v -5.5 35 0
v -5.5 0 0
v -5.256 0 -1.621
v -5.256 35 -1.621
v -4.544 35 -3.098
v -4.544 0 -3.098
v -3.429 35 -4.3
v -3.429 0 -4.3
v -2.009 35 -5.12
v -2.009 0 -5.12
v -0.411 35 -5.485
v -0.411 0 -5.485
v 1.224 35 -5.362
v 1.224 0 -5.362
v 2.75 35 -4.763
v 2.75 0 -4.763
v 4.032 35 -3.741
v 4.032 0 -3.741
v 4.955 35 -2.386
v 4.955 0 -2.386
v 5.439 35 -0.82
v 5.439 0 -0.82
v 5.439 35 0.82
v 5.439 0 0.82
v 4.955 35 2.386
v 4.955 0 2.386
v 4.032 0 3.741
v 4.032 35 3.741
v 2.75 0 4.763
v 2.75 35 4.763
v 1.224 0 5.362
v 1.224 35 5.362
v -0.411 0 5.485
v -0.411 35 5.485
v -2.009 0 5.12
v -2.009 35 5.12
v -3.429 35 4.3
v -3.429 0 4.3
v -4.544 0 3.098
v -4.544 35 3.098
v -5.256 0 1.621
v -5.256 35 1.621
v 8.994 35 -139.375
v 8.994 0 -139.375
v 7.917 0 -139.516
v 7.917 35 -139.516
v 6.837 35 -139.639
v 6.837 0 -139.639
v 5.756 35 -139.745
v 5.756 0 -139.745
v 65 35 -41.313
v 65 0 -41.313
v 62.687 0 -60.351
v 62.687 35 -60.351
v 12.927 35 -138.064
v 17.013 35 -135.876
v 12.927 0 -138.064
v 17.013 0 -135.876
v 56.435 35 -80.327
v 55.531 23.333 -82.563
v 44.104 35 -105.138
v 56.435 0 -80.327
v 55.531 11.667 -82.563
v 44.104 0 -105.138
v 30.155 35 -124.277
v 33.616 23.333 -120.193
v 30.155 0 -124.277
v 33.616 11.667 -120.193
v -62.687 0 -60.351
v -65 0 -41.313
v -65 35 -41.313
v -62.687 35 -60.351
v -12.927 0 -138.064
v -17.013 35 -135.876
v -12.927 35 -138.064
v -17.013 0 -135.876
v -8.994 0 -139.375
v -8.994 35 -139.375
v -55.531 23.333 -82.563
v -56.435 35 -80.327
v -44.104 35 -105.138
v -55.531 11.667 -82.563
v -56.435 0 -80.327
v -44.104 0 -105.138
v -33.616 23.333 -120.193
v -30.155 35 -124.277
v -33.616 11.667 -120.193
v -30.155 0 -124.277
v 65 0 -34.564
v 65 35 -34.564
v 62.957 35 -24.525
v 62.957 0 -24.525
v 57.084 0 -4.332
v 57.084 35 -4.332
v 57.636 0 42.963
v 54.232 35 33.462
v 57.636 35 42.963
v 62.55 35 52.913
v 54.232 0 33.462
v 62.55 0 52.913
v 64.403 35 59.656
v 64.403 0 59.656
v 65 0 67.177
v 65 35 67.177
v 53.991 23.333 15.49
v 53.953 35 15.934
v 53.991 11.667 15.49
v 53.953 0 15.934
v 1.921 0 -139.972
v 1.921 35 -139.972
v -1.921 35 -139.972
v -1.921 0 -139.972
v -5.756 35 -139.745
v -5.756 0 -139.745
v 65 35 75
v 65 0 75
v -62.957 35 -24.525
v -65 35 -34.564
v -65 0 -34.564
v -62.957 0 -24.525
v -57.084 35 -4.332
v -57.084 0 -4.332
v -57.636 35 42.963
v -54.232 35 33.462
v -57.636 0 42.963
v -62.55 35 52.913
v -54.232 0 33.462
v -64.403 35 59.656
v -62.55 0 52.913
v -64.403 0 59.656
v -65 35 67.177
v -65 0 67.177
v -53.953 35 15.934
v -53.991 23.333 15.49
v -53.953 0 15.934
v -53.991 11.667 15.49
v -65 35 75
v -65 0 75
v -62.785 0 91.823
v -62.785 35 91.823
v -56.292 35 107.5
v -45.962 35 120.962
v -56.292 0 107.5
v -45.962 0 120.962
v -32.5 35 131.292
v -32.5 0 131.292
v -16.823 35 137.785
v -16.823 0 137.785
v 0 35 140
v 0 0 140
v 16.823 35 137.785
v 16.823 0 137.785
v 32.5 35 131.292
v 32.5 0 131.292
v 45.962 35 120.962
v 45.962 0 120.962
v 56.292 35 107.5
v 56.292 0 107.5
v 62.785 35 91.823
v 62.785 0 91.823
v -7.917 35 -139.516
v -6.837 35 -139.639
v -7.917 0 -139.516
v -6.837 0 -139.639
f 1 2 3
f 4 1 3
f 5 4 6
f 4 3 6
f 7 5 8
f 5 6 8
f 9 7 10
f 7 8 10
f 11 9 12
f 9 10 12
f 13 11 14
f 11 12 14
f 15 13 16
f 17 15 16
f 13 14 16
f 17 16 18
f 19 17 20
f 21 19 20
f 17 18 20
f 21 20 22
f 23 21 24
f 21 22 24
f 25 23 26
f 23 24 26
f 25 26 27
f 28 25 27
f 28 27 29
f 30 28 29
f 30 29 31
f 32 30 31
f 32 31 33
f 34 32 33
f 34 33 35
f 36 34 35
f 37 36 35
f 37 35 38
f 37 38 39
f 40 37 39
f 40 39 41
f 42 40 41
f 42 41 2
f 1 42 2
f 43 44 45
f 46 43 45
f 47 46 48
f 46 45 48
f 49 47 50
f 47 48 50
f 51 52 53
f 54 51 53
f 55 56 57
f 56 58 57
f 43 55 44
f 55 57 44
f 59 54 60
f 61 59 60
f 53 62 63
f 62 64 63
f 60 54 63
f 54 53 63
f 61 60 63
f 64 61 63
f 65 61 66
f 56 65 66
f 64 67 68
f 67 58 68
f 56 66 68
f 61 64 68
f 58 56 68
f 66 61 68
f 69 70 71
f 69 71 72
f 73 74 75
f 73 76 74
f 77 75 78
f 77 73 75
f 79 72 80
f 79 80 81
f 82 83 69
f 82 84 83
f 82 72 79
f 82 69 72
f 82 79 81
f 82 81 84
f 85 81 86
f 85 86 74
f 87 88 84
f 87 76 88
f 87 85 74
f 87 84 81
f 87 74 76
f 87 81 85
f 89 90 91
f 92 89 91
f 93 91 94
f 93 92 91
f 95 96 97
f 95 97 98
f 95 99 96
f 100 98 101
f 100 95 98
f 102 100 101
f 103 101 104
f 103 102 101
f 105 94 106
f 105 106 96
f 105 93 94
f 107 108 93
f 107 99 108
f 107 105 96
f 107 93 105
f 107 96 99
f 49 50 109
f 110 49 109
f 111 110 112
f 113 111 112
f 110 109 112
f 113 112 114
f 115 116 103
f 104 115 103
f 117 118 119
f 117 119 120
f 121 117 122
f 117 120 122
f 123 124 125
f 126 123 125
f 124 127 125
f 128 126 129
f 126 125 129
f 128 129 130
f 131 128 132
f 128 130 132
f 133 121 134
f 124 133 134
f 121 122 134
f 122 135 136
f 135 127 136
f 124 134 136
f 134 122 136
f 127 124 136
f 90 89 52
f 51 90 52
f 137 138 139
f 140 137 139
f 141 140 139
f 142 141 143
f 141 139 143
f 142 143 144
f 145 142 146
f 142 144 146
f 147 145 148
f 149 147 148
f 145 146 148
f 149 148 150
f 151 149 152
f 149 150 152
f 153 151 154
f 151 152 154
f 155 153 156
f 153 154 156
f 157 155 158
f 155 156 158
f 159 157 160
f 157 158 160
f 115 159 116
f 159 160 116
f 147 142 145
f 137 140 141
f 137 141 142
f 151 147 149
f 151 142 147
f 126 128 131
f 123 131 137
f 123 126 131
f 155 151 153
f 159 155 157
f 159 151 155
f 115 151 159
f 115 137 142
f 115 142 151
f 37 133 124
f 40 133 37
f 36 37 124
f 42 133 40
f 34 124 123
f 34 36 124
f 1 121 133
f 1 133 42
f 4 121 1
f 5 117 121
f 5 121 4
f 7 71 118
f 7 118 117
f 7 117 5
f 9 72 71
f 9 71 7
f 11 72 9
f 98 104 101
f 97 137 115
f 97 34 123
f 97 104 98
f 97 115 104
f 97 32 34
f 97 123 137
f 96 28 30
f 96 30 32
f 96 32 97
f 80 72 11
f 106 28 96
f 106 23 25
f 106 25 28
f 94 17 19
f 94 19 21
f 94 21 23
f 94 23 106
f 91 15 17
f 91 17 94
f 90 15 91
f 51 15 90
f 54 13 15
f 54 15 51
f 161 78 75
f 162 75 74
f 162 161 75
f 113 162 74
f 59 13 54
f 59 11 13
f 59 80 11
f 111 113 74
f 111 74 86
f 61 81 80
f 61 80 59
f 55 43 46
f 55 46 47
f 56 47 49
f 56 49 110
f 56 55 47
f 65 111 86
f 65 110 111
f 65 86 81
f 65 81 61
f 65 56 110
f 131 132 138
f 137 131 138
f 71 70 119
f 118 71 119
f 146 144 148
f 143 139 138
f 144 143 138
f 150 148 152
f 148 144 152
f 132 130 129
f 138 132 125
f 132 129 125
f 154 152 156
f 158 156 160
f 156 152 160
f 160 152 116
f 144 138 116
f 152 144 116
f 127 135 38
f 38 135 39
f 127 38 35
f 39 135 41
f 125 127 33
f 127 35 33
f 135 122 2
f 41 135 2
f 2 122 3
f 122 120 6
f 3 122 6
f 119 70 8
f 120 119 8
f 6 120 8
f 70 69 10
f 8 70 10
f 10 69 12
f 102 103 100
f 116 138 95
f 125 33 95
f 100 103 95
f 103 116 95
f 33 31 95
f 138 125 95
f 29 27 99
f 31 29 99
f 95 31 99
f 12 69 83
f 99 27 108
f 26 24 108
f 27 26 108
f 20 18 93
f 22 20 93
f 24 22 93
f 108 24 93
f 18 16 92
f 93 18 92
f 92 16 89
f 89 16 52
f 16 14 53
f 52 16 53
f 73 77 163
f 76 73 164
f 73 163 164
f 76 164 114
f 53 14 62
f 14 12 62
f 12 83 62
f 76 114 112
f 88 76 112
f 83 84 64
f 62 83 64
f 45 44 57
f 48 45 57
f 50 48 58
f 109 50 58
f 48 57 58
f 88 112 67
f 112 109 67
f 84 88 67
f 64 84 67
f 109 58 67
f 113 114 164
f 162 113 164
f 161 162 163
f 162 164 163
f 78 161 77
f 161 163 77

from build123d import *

# Parameters (mm, degrees)
BOSS_EXTRUDE1_DEPTH   = 35
M10_CLEARANCE_HOLE1_D = 11


with BuildPart() as part:
    # Sketch1 → Boss-Extrude1 (new body)
    with BuildSketch(Plane(origin=(0, 0, 0), x_dir=(1, 0, 0), z_dir=(0, 1, 0))):
        with BuildLine():
            Line((65, 34.564378512), (65, 41.31320725))
            add(Edge.make_bspline(
                [(65, 41.31320725), (65, 79.431268024), (31.724329751, 134.359342402), (8.994063072, 139.37473751)],
                knots=[0, 0, 0, 0, 0.953598716, 0.953598716, 0.953598716, 0.953598716], degree=3))
            ThreePointArc((8.994063072, 139.37473751), (7.377306472, 139.579991865), (5.755912154, 139.744648237))
            ThreePointArc((5.755912154, 139.744648237), (0, 140), (-5.755912154, 139.744648237))
            ThreePointArc((-5.755912154, 139.744648237), (-7.377306472, 139.579991865), (-8.994063072, 139.37473751))
            add(Edge.make_bspline(
                [(-65, 41.31320725), (-65, 79.431268024), (-31.724329751, 134.359342402), (-8.994063072, 139.37473751)],
                knots=[0, 0, 0, 0, 0.953598716, 0.953598716, 0.953598716, 0.953598716], degree=3))
            Line((-65, 41.31320725), (-65, 34.564378512))
            add(Edge.make_bspline(
                [(-65, 34.564378512), (-65, 25.304446618), (-54.875938022, 10.00088171), (-52.508224213, -44.666118343), (-65, -48.330846971), (-65, -67.177210158)],
                knots=[0, 0, 0, 0, 0.557561402, 0.657561402, 1, 1, 1, 1], degree=3))
            Line((-65, -67.177210158), (-65, -75))
            ThreePointArc((-65, -75), (0, -140), (65, -75))
            Line((65, -75), (65, -67.177210158))
            add(Edge.make_bspline(
                [(65, 34.564378512), (65, 25.304446618), (54.875938022, 10.00088171), (52.508224213, -44.666118343), (65, -48.330846971), (65, -67.177210158)],
                knots=[0, 0, 0, 0, 0.557561402, 0.657561402, 1, 1, 1, 1], degree=3))
        make_face()
    extrude(amount=BOSS_EXTRUDE1_DEPTH)

    # M10 Clearance Hole1 (through all)
    with Locations(Plane(origin=(0, 35, 0), x_dir=(1, 0, 0), z_dir=(0, 1, 0))):
        with Locations((0, 0)):
            Hole(M10_CLEARANCE_HOLE1_D / 2)


solid = part.part
